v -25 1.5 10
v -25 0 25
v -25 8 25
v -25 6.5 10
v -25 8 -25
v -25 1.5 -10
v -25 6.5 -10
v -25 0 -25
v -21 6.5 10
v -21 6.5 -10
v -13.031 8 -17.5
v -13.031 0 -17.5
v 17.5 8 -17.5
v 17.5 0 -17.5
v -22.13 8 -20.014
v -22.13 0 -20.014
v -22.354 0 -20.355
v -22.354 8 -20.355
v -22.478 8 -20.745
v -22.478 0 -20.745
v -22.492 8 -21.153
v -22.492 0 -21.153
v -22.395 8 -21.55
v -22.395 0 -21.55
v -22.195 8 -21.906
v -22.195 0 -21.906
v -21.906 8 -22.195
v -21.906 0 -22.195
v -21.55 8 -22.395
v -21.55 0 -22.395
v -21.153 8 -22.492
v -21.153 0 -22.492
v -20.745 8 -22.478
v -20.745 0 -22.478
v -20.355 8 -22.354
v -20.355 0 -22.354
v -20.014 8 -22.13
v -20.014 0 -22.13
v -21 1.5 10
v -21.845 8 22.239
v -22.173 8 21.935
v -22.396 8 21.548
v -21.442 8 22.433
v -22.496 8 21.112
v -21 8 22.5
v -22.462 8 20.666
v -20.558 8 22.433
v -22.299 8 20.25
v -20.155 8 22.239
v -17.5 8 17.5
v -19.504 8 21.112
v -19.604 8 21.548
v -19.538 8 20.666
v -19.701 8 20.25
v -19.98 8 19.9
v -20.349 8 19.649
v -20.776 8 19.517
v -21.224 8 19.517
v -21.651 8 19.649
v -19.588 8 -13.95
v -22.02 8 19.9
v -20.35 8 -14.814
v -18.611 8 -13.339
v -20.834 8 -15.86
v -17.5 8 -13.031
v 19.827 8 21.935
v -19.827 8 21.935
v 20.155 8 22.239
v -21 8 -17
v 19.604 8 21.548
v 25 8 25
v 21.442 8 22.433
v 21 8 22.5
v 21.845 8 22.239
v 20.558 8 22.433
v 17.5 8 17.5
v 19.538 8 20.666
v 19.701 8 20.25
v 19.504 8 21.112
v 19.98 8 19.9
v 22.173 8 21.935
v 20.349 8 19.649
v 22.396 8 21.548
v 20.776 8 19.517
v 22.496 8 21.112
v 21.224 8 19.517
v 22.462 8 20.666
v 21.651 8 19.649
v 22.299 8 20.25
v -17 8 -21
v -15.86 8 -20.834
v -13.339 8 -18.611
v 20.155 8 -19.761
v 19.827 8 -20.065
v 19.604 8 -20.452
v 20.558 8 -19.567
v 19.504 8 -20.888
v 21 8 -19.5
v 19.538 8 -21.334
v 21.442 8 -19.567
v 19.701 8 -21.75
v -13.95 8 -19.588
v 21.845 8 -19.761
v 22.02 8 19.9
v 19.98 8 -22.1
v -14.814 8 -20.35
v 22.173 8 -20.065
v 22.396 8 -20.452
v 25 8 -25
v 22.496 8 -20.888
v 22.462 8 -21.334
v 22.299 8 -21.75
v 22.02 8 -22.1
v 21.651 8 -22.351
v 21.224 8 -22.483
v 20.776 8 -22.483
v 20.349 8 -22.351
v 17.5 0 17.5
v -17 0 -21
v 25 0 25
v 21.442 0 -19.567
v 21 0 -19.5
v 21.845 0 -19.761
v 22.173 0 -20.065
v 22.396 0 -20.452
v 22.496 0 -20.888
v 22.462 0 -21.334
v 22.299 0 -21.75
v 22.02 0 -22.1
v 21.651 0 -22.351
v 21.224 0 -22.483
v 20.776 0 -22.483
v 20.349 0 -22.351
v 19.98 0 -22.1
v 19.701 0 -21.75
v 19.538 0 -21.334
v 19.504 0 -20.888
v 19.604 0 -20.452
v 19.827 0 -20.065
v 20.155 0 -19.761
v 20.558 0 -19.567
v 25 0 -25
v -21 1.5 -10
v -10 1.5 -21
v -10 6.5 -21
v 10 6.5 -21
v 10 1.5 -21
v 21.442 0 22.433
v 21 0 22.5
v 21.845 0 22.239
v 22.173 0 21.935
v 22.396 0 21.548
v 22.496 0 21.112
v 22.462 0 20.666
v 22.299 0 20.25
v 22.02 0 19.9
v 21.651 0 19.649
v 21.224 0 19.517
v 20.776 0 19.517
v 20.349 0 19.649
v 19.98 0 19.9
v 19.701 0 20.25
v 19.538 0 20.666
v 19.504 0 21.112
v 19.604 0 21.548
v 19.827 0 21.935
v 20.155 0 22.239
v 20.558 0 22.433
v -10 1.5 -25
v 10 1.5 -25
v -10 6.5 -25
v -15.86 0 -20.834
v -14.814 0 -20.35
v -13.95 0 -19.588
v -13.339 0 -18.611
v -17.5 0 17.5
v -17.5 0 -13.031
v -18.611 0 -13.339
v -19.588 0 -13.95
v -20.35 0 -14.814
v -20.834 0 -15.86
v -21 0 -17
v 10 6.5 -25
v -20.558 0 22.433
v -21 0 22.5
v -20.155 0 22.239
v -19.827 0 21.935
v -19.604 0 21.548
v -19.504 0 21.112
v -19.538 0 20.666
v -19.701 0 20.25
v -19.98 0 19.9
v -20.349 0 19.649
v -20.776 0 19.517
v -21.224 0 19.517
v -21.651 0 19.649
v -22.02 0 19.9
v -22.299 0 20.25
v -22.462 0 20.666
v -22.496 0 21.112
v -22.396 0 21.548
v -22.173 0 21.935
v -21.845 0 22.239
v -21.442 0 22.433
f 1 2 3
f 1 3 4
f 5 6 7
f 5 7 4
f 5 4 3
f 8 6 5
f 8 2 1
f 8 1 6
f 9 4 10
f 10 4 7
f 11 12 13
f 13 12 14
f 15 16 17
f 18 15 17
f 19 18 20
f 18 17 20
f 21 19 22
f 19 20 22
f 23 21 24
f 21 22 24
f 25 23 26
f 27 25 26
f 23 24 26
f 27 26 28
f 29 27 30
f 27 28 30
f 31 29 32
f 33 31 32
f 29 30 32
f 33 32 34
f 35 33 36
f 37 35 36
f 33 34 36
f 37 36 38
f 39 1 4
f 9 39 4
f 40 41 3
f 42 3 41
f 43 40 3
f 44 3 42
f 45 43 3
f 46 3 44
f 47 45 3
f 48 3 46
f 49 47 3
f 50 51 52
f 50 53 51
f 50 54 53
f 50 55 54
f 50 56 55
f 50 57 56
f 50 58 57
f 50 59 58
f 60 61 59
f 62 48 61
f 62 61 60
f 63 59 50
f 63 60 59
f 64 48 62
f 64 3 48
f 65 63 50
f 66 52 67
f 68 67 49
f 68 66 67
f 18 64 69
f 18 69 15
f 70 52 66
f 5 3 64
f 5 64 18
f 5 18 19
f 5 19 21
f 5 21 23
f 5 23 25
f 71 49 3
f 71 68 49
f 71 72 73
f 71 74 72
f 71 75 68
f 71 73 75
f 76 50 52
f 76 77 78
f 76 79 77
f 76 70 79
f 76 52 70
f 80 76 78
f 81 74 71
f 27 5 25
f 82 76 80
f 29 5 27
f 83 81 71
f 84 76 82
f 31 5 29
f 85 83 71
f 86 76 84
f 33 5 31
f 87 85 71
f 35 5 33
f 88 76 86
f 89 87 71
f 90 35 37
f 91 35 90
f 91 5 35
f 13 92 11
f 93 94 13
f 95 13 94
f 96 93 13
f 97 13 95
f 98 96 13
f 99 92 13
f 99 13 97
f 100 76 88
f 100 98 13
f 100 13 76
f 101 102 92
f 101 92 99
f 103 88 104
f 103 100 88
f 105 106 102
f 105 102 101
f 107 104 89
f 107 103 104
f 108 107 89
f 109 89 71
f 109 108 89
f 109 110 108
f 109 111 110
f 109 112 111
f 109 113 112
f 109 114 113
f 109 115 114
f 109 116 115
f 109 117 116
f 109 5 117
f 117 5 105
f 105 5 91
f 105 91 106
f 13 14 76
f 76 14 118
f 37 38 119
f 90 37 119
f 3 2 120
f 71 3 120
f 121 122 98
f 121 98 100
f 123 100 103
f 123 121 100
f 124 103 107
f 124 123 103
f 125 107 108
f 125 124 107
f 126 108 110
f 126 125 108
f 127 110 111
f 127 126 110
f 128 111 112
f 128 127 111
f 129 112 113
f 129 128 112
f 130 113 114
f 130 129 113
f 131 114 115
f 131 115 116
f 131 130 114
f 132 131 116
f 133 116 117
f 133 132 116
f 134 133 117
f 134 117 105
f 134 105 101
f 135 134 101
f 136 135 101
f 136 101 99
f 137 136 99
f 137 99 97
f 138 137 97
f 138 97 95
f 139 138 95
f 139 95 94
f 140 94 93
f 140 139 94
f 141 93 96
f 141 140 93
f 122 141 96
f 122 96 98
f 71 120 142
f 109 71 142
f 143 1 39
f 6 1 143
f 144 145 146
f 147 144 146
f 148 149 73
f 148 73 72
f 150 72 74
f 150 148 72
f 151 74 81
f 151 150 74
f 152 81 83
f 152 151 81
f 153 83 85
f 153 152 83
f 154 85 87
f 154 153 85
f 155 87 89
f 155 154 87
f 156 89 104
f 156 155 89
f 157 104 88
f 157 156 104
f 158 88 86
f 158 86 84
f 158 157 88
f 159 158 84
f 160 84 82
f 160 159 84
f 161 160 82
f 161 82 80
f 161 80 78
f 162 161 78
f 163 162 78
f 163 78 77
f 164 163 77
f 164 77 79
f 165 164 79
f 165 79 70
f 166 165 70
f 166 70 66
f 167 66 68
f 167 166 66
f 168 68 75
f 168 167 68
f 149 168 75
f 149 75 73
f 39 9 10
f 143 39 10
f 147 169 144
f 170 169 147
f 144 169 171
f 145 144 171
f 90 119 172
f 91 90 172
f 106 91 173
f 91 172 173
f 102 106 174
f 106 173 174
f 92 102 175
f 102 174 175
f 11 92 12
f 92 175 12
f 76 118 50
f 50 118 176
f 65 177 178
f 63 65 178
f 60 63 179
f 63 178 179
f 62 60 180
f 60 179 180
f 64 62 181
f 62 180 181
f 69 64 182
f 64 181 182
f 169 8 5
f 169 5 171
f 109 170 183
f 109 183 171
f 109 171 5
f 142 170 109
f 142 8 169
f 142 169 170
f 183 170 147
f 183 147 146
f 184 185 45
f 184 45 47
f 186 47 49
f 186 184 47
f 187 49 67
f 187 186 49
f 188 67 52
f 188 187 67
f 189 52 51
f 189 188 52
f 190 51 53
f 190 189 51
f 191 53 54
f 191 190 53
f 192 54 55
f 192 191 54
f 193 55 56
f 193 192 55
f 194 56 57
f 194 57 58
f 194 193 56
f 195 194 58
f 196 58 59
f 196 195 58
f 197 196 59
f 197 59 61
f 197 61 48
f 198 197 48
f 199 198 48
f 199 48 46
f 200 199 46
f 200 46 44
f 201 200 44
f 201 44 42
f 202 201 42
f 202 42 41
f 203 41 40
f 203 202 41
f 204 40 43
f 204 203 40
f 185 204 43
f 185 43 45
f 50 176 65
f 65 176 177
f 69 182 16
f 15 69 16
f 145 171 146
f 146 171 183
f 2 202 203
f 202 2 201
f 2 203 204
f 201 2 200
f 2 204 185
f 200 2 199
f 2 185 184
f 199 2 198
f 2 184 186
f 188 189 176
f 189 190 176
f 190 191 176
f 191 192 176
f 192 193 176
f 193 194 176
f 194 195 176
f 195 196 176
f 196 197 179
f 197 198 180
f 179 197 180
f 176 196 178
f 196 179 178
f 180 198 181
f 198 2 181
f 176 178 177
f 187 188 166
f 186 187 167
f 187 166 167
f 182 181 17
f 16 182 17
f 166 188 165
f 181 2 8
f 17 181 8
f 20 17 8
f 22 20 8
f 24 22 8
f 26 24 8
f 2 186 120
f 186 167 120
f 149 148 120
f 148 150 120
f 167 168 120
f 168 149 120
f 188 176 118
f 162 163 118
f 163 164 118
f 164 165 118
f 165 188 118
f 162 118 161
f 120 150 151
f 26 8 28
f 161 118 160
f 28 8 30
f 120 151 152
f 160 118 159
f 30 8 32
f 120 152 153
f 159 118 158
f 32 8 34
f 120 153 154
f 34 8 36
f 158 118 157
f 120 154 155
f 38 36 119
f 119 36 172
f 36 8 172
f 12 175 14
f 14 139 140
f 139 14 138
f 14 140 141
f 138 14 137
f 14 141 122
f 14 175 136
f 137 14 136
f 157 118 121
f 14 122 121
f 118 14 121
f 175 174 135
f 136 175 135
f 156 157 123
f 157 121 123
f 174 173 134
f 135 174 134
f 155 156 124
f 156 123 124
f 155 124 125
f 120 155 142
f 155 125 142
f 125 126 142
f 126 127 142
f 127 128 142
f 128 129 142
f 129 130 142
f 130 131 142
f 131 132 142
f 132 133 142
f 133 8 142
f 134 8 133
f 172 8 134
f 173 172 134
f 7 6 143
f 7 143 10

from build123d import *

# Parameters (mm, degrees)
SKETCH1_W       = 50
SKETCH1_H       = 50
SKETCH1_R       = 1.5
SUPPORT_DEPTH   = 8
NORTH_START     = -25
SKETCH2_W       = 20
SKETCH2_H       = 5
NORTH_CUT_DEPTH = 4
WEST_START      = -25
SKETCH3_W       = 20
SKETCH3_H       = 5
WEST_CUT_DEPTH  = 4


with BuildPart() as part:
    # Sketch1 → Support (new body)
    with BuildSketch(Plane(origin=(0, 0, 0), x_dir=(1, 0, 0), z_dir=(0, 1, 0))):
        Rectangle(SKETCH1_W, SKETCH1_H)
        with Locations(Location((-21, -21, 0), (0, 0, 270))):
            Circle(SKETCH1_R, mode=Mode.SUBTRACT)
        with Locations(Location((21, -21, 0), (0, 0, 270))):
            Circle(SKETCH1_R, mode=Mode.SUBTRACT)
        with BuildLine():
            Line((-13.031373033, 17.5), (17.5, 17.5))
            Line((17.5, 17.5), (17.5, -17.5))
            Line((17.5, -17.5), (-17.5, -17.5))
            Line((-17.5, -17.5), (-17.5, 13.031373033))
            ThreePointArc((-17.5, 13.031373033), (-20, 14.354248689), (-21, 17))
            Line((-21, 17), (-22.130136986, 20.01369863))
            ThreePointArc((-22.130136986, 20.01369863), (-22.060660172, 22.060660172), (-20.01369863, 22.130136986))
            Line((-20.01369863, 22.130136986), (-17, 21))
            ThreePointArc((-17, 21), (-14.354248689, 20), (-13.031373033, 17.5))
        make_face(mode=Mode.SUBTRACT)
        with Locations(Location((21, 21, 0), (0, 0, 270))):
            Circle(SKETCH1_R, mode=Mode.SUBTRACT)
    extrude(amount=SUPPORT_DEPTH)

    # Sketch2 → North Cut (cut)
    with BuildSketch(Plane.XY.offset(NORTH_START)):
        with Locations((0, 4)):
            Rectangle(SKETCH2_W, SKETCH2_H)
    extrude(amount=NORTH_CUT_DEPTH, mode=Mode.SUBTRACT)

    # Sketch3 → West Cut (cut)
    with BuildSketch(Plane(origin=(0, 0, 0), x_dir=(0, 0, -1), z_dir=(1, 0, 0)).offset(WEST_START)):
        with Locations((0, 4)):
            Rectangle(SKETCH3_W, SKETCH3_H)
    extrude(amount=WEST_CUT_DEPTH, mode=Mode.SUBTRACT)


solid = part.part
